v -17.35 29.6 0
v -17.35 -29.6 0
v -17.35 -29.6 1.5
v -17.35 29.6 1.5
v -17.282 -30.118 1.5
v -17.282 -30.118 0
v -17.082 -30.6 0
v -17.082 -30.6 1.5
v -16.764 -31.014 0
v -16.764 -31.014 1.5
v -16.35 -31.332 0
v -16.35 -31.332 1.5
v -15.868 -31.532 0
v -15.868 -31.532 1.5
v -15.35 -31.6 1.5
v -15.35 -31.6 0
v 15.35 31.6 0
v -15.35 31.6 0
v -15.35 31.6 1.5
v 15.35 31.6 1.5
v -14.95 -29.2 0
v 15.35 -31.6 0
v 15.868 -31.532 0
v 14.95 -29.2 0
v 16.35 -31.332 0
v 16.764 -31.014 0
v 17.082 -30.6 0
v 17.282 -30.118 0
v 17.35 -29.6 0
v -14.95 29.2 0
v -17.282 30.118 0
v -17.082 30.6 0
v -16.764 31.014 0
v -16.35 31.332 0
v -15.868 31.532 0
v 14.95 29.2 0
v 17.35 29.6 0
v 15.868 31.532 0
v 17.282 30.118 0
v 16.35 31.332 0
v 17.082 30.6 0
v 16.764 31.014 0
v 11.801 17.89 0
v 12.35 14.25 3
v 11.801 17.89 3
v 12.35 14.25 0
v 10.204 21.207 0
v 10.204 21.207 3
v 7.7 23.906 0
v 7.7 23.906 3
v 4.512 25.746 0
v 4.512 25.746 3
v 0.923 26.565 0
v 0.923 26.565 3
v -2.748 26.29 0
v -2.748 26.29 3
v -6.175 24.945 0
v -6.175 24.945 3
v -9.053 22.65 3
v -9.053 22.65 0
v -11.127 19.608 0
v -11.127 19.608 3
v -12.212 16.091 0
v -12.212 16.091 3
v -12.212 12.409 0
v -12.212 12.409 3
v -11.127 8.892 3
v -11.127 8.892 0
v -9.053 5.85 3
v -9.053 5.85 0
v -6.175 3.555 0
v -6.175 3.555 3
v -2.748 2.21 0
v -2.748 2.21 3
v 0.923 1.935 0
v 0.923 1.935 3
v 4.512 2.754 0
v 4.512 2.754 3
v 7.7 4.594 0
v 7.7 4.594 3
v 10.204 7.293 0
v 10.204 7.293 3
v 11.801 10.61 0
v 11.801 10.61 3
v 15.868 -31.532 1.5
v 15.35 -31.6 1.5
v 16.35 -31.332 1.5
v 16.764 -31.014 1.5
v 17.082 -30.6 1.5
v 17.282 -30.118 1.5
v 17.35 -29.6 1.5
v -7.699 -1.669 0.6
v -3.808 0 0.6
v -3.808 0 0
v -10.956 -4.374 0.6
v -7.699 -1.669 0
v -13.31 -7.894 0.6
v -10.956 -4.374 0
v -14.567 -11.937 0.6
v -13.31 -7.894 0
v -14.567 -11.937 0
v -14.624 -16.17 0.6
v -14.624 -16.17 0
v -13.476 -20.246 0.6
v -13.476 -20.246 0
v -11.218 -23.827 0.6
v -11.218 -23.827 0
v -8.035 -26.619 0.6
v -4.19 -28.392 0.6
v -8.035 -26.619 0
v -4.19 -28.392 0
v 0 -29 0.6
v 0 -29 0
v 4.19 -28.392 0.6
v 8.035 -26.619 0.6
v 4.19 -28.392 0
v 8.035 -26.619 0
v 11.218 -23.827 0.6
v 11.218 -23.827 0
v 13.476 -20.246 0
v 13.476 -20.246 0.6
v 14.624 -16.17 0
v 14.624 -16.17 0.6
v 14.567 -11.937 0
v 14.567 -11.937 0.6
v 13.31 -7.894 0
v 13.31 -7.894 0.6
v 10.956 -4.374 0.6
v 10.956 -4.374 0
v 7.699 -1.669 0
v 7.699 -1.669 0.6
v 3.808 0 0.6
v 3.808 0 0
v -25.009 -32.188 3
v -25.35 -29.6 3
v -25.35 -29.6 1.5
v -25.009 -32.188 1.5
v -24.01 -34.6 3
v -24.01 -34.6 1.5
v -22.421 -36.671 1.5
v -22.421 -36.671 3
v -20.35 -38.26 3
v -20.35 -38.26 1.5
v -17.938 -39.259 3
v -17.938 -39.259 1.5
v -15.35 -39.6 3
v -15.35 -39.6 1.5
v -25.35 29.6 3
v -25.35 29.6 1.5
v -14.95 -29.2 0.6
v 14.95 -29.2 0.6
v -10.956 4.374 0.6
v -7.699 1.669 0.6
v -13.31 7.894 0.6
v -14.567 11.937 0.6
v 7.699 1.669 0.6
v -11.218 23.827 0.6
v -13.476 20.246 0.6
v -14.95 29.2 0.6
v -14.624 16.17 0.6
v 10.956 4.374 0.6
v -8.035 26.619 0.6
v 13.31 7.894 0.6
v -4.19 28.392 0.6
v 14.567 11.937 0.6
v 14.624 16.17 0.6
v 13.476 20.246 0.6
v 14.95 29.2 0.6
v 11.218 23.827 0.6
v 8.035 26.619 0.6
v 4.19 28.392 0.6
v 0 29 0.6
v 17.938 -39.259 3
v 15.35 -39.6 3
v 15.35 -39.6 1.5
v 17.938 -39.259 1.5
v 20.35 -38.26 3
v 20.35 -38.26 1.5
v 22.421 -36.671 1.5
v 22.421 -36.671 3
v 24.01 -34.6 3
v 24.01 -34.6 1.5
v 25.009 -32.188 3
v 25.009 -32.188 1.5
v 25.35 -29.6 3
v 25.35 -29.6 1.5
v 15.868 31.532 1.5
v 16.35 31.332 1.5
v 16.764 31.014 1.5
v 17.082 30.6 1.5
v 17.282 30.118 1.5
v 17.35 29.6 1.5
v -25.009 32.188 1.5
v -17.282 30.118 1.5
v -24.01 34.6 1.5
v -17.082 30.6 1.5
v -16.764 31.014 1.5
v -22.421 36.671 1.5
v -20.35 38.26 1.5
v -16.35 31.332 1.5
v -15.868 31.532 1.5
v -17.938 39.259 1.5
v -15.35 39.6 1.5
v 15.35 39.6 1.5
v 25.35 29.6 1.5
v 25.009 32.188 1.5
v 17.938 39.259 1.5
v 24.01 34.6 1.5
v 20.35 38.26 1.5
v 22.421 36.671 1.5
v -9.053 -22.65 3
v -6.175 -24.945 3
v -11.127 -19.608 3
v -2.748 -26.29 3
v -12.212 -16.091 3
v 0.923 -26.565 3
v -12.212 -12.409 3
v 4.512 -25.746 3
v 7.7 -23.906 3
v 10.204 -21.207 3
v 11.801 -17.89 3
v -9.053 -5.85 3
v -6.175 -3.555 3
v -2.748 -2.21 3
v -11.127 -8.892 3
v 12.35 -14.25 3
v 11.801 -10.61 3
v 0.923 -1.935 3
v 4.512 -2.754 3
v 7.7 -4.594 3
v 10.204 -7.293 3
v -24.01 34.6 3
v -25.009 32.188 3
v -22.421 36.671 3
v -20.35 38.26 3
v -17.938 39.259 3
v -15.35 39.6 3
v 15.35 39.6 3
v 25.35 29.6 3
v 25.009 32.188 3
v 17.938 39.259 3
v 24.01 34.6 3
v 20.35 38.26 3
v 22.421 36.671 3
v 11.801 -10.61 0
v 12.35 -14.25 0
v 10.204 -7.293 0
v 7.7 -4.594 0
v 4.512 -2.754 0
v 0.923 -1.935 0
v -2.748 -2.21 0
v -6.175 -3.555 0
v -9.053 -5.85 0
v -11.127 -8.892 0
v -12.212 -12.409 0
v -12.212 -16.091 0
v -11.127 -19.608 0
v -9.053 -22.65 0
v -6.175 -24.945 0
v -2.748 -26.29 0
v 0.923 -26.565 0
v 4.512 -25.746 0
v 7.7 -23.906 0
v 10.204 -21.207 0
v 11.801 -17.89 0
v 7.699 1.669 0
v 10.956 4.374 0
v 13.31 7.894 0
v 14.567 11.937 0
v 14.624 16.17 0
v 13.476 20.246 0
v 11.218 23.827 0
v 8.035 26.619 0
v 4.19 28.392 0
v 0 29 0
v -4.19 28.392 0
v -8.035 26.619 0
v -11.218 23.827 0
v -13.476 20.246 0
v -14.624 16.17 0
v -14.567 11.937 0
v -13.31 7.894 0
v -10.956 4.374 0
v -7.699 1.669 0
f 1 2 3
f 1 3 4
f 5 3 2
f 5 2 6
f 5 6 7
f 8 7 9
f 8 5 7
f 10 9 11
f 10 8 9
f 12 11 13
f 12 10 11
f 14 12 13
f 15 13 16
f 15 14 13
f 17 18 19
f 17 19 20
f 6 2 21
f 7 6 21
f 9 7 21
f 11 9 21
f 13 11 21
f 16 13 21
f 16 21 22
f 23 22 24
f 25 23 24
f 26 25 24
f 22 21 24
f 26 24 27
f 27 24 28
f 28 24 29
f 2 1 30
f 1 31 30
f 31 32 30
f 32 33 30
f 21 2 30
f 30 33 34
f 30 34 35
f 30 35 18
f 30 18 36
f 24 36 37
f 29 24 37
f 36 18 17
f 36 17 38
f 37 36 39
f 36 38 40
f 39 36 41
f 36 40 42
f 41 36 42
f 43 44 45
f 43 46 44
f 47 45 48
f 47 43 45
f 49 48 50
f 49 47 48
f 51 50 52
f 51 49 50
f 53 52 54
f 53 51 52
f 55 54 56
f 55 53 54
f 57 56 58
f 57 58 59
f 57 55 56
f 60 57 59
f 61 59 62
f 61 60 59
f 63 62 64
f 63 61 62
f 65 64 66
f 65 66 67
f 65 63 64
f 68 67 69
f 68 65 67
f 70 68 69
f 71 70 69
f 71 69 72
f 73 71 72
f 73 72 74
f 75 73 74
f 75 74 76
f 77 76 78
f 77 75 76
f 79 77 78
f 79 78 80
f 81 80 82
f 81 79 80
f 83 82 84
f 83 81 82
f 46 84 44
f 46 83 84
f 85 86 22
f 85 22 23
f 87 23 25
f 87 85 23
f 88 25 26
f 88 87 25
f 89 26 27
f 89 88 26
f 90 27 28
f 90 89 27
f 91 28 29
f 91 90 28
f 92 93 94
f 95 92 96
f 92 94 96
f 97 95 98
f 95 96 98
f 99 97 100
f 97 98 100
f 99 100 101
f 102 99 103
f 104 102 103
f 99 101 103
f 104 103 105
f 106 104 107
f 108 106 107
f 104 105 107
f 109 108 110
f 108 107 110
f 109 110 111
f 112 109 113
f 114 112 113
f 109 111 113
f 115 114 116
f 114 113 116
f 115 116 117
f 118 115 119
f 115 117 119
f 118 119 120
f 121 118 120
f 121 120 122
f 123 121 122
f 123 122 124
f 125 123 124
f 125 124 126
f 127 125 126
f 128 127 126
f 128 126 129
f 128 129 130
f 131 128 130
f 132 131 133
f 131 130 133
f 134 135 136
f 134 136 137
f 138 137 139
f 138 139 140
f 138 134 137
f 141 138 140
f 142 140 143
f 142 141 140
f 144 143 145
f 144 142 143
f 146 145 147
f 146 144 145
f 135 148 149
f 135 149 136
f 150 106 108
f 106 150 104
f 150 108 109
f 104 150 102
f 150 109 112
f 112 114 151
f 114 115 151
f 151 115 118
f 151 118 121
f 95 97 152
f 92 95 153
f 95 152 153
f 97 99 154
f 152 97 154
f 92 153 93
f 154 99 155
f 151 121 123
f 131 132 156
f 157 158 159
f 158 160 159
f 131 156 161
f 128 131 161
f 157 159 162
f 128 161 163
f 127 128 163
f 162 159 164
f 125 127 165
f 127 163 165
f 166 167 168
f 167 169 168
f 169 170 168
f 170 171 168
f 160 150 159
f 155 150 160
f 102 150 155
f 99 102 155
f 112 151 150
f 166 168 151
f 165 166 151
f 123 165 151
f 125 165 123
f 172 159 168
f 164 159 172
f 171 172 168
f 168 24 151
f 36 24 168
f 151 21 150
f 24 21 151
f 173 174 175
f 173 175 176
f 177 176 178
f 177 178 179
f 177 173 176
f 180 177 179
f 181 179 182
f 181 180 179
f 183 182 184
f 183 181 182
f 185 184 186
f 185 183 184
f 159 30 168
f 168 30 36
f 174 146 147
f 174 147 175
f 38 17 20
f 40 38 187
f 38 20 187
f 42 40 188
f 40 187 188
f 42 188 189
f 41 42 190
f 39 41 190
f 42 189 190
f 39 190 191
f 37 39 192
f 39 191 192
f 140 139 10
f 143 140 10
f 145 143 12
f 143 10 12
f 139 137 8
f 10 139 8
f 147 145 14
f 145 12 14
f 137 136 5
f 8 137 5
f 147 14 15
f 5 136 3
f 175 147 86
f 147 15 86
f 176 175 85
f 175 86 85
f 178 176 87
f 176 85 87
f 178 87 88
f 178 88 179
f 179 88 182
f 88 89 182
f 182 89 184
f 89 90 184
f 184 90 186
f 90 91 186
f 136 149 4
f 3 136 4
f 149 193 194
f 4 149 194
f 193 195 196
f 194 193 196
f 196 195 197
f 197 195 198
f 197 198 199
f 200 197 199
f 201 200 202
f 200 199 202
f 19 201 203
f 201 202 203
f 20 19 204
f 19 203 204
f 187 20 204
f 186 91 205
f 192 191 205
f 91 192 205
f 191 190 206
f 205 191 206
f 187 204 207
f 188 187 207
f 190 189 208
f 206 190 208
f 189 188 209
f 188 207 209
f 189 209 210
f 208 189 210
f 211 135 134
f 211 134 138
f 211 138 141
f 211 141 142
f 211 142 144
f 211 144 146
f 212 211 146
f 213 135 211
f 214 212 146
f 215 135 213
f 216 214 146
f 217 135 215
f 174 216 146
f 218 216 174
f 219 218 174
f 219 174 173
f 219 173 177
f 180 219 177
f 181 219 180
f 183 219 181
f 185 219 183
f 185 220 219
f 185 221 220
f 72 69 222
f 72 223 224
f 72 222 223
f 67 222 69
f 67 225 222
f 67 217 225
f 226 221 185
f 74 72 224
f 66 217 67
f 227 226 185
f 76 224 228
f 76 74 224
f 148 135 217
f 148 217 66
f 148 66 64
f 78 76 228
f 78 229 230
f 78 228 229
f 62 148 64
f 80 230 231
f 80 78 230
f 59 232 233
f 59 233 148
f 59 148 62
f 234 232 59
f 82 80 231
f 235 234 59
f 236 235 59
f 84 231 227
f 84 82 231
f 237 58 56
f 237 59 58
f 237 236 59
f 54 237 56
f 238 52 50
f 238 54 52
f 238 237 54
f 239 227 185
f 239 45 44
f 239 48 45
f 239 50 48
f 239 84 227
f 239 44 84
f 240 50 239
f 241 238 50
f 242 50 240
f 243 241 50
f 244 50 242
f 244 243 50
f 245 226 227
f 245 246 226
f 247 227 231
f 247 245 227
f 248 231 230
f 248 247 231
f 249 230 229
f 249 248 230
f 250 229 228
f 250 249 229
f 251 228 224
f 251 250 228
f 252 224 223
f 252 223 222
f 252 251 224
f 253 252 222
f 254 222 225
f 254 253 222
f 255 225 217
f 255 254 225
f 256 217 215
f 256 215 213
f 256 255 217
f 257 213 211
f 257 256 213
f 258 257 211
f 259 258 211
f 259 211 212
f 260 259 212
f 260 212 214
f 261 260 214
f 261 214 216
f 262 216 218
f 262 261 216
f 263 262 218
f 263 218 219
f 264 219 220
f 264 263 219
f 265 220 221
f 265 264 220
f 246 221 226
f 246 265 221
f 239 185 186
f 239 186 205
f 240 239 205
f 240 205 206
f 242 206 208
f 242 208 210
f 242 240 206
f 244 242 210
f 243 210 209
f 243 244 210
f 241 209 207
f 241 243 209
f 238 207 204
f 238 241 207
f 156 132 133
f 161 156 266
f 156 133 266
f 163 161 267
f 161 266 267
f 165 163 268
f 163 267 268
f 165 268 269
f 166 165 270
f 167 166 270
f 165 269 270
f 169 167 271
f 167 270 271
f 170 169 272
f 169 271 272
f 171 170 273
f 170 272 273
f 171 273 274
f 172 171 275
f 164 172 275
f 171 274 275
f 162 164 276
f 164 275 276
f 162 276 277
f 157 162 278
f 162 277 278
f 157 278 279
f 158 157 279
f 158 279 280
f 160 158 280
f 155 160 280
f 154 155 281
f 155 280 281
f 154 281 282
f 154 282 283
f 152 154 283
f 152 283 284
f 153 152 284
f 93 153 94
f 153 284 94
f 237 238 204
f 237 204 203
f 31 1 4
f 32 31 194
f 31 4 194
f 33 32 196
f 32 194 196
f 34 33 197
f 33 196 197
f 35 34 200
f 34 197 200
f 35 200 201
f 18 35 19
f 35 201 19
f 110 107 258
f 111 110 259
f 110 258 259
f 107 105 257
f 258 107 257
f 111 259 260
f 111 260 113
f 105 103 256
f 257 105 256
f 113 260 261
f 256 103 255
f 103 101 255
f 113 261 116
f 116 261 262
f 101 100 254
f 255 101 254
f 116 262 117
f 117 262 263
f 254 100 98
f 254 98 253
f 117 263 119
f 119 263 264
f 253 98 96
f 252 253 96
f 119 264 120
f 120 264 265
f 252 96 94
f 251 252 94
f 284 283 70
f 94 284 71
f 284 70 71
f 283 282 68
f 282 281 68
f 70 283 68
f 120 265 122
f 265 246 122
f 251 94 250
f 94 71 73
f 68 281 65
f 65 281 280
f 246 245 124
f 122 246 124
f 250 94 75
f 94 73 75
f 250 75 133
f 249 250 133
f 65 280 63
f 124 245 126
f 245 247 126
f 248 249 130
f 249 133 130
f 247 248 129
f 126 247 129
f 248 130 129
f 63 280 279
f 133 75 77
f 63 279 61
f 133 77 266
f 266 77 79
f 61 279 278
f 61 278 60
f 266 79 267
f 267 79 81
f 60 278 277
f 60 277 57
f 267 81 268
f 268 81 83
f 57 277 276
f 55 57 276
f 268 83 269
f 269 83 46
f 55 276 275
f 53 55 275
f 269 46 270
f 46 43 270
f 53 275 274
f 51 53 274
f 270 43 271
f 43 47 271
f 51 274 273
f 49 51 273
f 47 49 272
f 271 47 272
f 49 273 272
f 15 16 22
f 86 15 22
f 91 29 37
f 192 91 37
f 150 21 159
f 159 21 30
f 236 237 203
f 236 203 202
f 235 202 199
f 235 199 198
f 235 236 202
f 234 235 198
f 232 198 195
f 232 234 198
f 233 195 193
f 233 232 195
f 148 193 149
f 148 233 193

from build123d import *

# Parameters (mm, degrees)
F0_W     = 34.7
F0_H     = 63.2
F0_R     = 12.35
F1_DEPTH = 3
F2_R     = 2
F3_T     = -2.4
F4_R     = 12.35
F5_DEPTH = 1.5


with BuildPart() as f1:
    # F0 (on Top) → F1 (new body)
    with BuildSketch(Plane.XY):
        Rectangle(F0_W, F0_H)
        with Locations((0, -14.25)):
            Circle(F0_R, mode=Mode.SUBTRACT)
        with Locations((0, 14.25)):
            Circle(F0_R, mode=Mode.SUBTRACT)
    extrude(amount=F1_DEPTH)

    # F2
    f2_edges = [f1.edges().sort_by_distance(p)[0] for p in [
        (-17.35, 31.6, 1.5),
        (-17.35, -31.6, 1.5),
        (17.35, -31.6, 1.5),
        (17.35, 31.6, 1.5),
    ]]
    fillet(f2_edges, radius=F2_R)

    # F3
    f3_openings = [f1.faces().sort_by_distance(p)[0] for p in [
        (0, 0, 0),
    ]]
    offset(amount=F3_T, openings=f3_openings)

    # F4 (on face) → F5 (join)
    with BuildSketch(Plane.XY.offset(3)):
        with BuildLine():
            Line((25.35, -29.6), (25.35, 29.6))
            ThreePointArc((25.35, 29.6), (22.4210678119, 36.6710678119), (15.35, 39.6))
            Line((15.35, 39.6), (-15.35, 39.6))
            ThreePointArc((-15.35, 39.6), (-22.4210678119, 36.6710678119), (-25.35, 29.6))
            Line((-25.35, 29.6), (-25.35, -29.6))
            ThreePointArc((-25.35, -29.6), (-22.4210678119, -36.6710678119), (-15.35, -39.6))
            Line((-15.35, -39.6), (15.35, -39.6))
            ThreePointArc((15.35, -39.6), (22.4210678119, -36.6710678119), (25.35, -29.6))
        make_face()
        with Locations((0, -14.25)):
            Circle(F4_R, mode=Mode.SUBTRACT)
        with Locations((0, 14.25)):
            Circle(F4_R, mode=Mode.SUBTRACT)
    extrude(amount=-F5_DEPTH)


solid = f1.part
